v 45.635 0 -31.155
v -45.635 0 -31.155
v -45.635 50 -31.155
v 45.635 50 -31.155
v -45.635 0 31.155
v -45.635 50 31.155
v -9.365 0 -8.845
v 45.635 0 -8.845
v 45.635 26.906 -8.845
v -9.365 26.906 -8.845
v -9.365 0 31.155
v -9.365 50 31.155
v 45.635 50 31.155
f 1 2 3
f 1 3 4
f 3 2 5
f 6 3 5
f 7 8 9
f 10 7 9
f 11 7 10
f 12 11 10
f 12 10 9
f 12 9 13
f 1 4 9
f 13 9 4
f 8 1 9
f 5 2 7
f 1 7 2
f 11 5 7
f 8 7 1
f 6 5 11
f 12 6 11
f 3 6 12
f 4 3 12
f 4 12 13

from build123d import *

# Parameters (mm, degrees)
F0_W     = 91.270662
F0_H     = 62.30978
F1_DEPTH = 50
F3_DEPTH = 55


with BuildPart() as f1:
    # F0 (on Front) → F1 (new body)
    with BuildSketch(Plane.XZ):
        Rectangle(F0_W, F0_H)
    extrude(amount=-F1_DEPTH)

    # F2 (on face) → F3 (cut)
    with BuildSketch(Plane.YZ.offset(45.635331)):
        Polygon((0, 31.15489), (0, -8.84511), (26.905989, -8.84511), (50, 31.15489), align=None)
    extrude(amount=-F3_DEPTH, mode=Mode.SUBTRACT)


solid = f1.part
